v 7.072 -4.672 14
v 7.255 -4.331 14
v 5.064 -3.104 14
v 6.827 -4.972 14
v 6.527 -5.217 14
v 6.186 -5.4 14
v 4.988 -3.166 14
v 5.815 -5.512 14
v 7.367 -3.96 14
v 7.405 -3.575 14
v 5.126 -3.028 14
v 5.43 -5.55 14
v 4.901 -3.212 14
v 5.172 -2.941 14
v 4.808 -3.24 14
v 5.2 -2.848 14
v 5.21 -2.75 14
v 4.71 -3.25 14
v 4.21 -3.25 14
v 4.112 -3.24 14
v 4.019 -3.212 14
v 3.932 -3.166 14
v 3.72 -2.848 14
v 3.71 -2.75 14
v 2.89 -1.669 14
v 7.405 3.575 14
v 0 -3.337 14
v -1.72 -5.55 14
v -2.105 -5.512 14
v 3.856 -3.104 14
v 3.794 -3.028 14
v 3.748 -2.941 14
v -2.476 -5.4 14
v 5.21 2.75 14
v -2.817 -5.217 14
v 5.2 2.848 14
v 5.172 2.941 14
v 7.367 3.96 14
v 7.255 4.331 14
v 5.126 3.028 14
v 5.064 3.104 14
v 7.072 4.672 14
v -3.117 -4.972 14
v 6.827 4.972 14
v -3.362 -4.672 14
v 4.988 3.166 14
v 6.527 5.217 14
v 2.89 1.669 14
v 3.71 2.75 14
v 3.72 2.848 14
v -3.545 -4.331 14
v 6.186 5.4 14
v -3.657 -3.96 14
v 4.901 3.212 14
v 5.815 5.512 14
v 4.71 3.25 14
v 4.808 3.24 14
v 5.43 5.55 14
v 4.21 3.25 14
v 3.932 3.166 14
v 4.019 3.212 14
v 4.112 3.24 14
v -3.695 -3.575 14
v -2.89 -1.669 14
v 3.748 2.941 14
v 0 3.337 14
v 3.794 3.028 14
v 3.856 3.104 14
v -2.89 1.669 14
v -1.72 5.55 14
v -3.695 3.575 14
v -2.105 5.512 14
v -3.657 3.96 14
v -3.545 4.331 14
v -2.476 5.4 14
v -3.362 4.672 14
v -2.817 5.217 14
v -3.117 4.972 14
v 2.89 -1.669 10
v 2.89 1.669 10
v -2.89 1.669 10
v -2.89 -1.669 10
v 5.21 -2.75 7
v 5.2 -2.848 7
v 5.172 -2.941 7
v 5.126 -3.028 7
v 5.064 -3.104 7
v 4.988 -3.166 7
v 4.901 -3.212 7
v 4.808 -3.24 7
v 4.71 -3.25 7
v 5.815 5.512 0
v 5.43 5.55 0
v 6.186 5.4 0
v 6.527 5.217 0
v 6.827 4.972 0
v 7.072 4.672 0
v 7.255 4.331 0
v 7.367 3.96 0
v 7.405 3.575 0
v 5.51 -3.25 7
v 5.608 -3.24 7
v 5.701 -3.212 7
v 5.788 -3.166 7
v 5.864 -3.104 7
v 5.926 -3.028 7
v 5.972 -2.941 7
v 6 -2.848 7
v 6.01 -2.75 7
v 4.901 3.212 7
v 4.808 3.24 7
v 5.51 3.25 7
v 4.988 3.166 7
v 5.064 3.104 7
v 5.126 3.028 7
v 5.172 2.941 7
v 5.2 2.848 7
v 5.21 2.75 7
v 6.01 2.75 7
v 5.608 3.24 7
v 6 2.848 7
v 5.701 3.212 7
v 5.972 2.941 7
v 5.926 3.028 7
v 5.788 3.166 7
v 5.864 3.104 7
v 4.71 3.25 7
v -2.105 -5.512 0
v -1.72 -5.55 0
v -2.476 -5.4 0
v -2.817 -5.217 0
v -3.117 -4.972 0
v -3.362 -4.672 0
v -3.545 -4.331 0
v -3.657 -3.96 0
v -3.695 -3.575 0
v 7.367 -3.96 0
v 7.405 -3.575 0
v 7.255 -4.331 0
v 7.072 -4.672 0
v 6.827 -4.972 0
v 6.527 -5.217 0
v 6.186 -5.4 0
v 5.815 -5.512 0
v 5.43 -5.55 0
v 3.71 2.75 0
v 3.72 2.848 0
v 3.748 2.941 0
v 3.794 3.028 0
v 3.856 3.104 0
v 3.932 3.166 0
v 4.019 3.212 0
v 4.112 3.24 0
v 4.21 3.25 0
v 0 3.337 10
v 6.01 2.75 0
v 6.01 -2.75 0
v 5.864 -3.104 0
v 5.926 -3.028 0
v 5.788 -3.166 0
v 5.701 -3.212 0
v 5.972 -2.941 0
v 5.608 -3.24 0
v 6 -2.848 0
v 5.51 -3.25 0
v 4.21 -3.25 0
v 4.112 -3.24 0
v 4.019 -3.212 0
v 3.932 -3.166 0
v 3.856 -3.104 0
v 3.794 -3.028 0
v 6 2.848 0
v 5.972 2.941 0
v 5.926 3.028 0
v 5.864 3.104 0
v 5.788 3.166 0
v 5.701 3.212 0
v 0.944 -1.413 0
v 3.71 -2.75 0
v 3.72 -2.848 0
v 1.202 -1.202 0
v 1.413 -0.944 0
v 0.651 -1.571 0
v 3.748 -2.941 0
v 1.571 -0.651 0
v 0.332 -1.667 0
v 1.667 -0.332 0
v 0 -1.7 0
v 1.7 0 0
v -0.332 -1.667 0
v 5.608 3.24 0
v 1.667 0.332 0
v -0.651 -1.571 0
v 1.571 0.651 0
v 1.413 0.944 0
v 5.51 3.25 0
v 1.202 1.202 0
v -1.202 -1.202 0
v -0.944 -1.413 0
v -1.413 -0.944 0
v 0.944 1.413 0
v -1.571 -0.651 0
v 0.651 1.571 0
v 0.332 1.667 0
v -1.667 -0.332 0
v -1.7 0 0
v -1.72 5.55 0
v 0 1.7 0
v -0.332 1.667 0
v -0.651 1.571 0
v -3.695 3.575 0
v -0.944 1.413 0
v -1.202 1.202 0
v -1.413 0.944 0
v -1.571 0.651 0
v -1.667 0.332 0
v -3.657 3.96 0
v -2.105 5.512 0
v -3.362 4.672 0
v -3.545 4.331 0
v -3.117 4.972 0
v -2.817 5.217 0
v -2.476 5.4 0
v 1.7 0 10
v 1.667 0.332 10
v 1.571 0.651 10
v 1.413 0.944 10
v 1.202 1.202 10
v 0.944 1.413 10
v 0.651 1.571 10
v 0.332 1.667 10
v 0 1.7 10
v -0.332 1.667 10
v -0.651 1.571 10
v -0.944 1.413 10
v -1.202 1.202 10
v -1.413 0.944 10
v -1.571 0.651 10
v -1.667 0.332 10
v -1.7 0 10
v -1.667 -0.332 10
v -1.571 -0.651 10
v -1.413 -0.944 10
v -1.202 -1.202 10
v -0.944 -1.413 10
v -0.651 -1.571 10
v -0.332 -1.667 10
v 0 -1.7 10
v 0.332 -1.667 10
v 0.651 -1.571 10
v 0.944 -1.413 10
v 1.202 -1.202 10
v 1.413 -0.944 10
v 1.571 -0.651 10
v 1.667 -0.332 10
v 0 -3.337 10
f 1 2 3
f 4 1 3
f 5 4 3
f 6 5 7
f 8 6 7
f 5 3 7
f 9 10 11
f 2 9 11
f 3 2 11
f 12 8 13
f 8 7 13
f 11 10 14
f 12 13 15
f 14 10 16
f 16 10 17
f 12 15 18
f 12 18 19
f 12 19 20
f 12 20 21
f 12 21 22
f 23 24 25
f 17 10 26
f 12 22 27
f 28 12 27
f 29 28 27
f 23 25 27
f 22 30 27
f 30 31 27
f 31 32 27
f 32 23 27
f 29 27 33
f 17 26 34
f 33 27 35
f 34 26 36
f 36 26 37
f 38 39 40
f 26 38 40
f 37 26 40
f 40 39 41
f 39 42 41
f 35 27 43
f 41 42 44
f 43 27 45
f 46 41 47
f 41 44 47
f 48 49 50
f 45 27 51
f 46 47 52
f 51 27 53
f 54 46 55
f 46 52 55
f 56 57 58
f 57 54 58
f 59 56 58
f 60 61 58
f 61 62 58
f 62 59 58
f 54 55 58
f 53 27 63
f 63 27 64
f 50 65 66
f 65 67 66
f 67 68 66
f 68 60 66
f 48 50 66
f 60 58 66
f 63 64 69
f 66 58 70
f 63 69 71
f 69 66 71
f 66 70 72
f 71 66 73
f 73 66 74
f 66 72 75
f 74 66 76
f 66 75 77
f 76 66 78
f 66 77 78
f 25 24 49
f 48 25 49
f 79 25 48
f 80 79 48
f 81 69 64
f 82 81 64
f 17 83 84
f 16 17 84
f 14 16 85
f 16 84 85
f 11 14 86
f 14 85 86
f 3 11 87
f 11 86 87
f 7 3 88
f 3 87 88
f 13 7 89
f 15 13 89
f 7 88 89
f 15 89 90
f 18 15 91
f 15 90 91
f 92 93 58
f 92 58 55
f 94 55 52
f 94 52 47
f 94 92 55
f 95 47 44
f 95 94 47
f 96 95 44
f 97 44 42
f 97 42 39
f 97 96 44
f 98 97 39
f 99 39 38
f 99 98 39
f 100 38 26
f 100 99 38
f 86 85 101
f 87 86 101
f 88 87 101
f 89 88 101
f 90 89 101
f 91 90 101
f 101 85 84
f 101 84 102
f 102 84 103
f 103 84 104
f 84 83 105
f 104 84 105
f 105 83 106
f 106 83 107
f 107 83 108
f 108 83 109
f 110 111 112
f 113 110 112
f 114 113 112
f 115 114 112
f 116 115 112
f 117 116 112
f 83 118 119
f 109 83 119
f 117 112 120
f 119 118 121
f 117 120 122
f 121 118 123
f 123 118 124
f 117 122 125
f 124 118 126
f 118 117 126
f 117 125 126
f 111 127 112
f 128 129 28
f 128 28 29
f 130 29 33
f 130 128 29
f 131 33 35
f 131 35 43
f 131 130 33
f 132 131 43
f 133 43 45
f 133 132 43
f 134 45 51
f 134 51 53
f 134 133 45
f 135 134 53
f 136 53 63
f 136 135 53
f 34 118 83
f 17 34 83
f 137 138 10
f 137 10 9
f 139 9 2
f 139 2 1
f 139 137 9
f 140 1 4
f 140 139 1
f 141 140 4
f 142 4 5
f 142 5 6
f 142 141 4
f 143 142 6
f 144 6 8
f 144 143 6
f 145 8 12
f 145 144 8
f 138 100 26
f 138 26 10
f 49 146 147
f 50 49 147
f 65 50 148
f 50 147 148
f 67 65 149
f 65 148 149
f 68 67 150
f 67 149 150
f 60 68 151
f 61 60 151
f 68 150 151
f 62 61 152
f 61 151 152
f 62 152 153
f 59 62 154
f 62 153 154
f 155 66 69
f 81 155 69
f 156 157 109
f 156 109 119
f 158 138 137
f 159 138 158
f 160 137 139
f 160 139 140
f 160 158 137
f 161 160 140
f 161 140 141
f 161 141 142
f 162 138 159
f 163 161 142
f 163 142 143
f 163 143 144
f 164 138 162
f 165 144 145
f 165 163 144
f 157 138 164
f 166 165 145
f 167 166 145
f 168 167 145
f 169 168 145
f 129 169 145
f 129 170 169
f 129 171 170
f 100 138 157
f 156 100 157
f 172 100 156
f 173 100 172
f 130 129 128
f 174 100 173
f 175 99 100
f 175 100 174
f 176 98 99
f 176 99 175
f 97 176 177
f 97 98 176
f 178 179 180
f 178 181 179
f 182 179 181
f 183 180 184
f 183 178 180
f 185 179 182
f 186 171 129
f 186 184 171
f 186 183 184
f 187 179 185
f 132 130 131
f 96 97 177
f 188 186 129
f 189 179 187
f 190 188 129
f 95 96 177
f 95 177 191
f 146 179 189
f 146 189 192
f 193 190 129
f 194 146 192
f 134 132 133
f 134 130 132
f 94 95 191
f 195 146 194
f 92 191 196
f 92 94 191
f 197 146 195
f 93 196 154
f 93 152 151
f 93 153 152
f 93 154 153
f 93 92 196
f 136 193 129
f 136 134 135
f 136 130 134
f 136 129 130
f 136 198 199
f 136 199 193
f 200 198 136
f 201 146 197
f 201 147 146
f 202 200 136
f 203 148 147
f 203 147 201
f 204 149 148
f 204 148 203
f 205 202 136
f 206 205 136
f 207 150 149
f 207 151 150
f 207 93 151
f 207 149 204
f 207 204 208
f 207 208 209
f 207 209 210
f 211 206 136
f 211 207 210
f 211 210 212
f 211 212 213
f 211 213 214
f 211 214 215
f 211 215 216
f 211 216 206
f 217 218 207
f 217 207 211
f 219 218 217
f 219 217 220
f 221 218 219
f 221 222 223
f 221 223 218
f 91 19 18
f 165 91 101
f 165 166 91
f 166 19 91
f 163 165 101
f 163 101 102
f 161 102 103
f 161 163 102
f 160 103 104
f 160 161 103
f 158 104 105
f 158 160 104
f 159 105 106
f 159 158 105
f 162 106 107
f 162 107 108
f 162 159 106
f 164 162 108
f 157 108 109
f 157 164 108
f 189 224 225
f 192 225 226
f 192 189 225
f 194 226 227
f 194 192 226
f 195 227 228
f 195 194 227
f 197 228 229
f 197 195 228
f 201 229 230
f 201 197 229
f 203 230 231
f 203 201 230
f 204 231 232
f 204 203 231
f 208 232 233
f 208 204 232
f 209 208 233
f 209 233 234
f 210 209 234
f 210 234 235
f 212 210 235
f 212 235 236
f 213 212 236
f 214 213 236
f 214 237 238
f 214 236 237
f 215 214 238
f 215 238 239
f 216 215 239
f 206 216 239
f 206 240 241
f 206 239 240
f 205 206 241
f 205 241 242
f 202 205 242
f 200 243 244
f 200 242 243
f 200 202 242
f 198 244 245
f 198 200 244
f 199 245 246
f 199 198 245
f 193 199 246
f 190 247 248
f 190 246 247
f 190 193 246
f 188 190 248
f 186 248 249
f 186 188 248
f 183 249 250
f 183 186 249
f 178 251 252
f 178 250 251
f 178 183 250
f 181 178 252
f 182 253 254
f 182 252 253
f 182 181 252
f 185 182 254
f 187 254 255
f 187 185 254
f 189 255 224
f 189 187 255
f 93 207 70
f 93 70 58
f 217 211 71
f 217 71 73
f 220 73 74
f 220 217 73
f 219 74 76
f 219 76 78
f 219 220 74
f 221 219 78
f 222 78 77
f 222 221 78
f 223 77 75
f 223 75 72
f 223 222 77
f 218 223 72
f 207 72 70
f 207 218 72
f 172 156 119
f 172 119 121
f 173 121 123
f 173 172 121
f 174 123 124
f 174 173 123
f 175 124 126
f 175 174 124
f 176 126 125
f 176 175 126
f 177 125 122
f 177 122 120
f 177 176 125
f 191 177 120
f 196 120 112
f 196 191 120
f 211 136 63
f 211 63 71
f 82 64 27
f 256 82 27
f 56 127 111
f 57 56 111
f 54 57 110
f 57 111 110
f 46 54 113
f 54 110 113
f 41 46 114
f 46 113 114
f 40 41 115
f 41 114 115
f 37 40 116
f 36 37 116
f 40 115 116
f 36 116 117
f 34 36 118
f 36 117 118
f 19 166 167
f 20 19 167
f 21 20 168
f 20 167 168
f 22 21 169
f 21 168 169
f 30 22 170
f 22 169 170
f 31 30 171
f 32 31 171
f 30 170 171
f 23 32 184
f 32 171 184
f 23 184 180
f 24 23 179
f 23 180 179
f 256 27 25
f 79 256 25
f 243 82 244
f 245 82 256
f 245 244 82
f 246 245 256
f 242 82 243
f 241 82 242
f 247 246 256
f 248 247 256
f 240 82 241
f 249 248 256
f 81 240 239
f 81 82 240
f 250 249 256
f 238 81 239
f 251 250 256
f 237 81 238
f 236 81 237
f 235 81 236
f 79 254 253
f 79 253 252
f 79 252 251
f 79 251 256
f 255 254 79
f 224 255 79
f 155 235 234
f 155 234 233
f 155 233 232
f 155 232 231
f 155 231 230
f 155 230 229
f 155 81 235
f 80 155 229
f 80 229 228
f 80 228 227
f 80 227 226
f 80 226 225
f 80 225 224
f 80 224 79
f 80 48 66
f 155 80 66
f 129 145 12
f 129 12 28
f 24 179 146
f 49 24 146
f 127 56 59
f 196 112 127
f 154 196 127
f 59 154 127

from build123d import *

# Parameters (mm, degrees)
SKETCH1_R           = 1.7
BOSS_EXTRUDE1_DEPTH = 14
CUT_EXTRUDE1_DEPTH  = 4
CUT_EXTRUDE2_DEPTH  = 7


with BuildPart() as part:
    # Sketch1 → Boss-Extrude1 (new body)
    with BuildSketch(Plane.XY):
        with BuildLine():
            Line((-3.695, -3.575), (-3.695, 3.575))
            ThreePointArc((-3.695, 3.575), (-3.116535893, 4.971535893), (-1.72, 5.55))
            Line((-1.72, 5.55), (5.43, 5.55))
            ThreePointArc((5.43, 5.55), (6.826535893, 4.971535893), (7.405, 3.575))
            Line((7.405, 3.575), (7.405, -3.575))
            ThreePointArc((7.405, -3.575), (6.826535893, -4.971535893), (5.43, -5.55))
            Line((5.43, -5.55), (-1.72, -5.55))
            ThreePointArc((-1.72, -5.55), (-3.116535893, -4.971535893), (-3.695, -3.575))
        make_face()
        Circle(SKETCH1_R, mode=Mode.SUBTRACT)
        with BuildLine():
            Line((5.21, 2.75), (5.21, -2.75))
            ThreePointArc((5.21, -2.75), (5.063553391, -3.103553391), (4.71, -3.25))
            Line((4.71, -3.25), (4.21, -3.25))
            ThreePointArc((4.21, -3.25), (3.856446609, -3.103553391), (3.71, -2.75))
            Line((3.71, -2.75), (3.71, 2.75))
            ThreePointArc((3.71, 2.75), (3.856446609, 3.103553391), (4.21, 3.25))
            Line((4.21, 3.25), (4.71, 3.25))
            ThreePointArc((4.71, 3.25), (5.063553391, 3.103553391), (5.21, 2.75))
        make_face(mode=Mode.SUBTRACT)
    extrude(amount=BOSS_EXTRUDE1_DEPTH)

    # Sketch2 → Cut-Extrude1 (cut)
    with BuildSketch(Plane.XY.offset(14)):
        Polygon((0, 3.337084556), (-2.89, 1.668542278), (-2.89, -1.668542278), (0, -3.337084556), (2.89, -1.668542278), (2.89, 1.668542278), align=None)
    extrude(amount=-CUT_EXTRUDE1_DEPTH, mode=Mode.SUBTRACT)

    # Sketch3 → Cut-Extrude2 (cut)
    with BuildSketch(Plane.XY):
        with BuildLine():
            Line((3.71, 2.75), (3.71, -2.75))
            ThreePointArc((3.71, -2.75), (3.856446609, -3.103553391), (4.21, -3.25))
            Line((4.21, -3.25), (5.51, -3.25))
            ThreePointArc((5.51, -3.25), (5.863553391, -3.103553391), (6.01, -2.75))
            Line((6.01, -2.75), (6.01, 2.75))
            ThreePointArc((6.01, 2.75), (5.863553391, 3.103553391), (5.51, 3.25))
            Line((5.51, 3.25), (4.21, 3.25))
            ThreePointArc((4.21, 3.25), (3.856446609, 3.103553391), (3.71, 2.75))
        make_face()
    extrude(amount=CUT_EXTRUDE2_DEPTH, mode=Mode.SUBTRACT)


solid = part.part
